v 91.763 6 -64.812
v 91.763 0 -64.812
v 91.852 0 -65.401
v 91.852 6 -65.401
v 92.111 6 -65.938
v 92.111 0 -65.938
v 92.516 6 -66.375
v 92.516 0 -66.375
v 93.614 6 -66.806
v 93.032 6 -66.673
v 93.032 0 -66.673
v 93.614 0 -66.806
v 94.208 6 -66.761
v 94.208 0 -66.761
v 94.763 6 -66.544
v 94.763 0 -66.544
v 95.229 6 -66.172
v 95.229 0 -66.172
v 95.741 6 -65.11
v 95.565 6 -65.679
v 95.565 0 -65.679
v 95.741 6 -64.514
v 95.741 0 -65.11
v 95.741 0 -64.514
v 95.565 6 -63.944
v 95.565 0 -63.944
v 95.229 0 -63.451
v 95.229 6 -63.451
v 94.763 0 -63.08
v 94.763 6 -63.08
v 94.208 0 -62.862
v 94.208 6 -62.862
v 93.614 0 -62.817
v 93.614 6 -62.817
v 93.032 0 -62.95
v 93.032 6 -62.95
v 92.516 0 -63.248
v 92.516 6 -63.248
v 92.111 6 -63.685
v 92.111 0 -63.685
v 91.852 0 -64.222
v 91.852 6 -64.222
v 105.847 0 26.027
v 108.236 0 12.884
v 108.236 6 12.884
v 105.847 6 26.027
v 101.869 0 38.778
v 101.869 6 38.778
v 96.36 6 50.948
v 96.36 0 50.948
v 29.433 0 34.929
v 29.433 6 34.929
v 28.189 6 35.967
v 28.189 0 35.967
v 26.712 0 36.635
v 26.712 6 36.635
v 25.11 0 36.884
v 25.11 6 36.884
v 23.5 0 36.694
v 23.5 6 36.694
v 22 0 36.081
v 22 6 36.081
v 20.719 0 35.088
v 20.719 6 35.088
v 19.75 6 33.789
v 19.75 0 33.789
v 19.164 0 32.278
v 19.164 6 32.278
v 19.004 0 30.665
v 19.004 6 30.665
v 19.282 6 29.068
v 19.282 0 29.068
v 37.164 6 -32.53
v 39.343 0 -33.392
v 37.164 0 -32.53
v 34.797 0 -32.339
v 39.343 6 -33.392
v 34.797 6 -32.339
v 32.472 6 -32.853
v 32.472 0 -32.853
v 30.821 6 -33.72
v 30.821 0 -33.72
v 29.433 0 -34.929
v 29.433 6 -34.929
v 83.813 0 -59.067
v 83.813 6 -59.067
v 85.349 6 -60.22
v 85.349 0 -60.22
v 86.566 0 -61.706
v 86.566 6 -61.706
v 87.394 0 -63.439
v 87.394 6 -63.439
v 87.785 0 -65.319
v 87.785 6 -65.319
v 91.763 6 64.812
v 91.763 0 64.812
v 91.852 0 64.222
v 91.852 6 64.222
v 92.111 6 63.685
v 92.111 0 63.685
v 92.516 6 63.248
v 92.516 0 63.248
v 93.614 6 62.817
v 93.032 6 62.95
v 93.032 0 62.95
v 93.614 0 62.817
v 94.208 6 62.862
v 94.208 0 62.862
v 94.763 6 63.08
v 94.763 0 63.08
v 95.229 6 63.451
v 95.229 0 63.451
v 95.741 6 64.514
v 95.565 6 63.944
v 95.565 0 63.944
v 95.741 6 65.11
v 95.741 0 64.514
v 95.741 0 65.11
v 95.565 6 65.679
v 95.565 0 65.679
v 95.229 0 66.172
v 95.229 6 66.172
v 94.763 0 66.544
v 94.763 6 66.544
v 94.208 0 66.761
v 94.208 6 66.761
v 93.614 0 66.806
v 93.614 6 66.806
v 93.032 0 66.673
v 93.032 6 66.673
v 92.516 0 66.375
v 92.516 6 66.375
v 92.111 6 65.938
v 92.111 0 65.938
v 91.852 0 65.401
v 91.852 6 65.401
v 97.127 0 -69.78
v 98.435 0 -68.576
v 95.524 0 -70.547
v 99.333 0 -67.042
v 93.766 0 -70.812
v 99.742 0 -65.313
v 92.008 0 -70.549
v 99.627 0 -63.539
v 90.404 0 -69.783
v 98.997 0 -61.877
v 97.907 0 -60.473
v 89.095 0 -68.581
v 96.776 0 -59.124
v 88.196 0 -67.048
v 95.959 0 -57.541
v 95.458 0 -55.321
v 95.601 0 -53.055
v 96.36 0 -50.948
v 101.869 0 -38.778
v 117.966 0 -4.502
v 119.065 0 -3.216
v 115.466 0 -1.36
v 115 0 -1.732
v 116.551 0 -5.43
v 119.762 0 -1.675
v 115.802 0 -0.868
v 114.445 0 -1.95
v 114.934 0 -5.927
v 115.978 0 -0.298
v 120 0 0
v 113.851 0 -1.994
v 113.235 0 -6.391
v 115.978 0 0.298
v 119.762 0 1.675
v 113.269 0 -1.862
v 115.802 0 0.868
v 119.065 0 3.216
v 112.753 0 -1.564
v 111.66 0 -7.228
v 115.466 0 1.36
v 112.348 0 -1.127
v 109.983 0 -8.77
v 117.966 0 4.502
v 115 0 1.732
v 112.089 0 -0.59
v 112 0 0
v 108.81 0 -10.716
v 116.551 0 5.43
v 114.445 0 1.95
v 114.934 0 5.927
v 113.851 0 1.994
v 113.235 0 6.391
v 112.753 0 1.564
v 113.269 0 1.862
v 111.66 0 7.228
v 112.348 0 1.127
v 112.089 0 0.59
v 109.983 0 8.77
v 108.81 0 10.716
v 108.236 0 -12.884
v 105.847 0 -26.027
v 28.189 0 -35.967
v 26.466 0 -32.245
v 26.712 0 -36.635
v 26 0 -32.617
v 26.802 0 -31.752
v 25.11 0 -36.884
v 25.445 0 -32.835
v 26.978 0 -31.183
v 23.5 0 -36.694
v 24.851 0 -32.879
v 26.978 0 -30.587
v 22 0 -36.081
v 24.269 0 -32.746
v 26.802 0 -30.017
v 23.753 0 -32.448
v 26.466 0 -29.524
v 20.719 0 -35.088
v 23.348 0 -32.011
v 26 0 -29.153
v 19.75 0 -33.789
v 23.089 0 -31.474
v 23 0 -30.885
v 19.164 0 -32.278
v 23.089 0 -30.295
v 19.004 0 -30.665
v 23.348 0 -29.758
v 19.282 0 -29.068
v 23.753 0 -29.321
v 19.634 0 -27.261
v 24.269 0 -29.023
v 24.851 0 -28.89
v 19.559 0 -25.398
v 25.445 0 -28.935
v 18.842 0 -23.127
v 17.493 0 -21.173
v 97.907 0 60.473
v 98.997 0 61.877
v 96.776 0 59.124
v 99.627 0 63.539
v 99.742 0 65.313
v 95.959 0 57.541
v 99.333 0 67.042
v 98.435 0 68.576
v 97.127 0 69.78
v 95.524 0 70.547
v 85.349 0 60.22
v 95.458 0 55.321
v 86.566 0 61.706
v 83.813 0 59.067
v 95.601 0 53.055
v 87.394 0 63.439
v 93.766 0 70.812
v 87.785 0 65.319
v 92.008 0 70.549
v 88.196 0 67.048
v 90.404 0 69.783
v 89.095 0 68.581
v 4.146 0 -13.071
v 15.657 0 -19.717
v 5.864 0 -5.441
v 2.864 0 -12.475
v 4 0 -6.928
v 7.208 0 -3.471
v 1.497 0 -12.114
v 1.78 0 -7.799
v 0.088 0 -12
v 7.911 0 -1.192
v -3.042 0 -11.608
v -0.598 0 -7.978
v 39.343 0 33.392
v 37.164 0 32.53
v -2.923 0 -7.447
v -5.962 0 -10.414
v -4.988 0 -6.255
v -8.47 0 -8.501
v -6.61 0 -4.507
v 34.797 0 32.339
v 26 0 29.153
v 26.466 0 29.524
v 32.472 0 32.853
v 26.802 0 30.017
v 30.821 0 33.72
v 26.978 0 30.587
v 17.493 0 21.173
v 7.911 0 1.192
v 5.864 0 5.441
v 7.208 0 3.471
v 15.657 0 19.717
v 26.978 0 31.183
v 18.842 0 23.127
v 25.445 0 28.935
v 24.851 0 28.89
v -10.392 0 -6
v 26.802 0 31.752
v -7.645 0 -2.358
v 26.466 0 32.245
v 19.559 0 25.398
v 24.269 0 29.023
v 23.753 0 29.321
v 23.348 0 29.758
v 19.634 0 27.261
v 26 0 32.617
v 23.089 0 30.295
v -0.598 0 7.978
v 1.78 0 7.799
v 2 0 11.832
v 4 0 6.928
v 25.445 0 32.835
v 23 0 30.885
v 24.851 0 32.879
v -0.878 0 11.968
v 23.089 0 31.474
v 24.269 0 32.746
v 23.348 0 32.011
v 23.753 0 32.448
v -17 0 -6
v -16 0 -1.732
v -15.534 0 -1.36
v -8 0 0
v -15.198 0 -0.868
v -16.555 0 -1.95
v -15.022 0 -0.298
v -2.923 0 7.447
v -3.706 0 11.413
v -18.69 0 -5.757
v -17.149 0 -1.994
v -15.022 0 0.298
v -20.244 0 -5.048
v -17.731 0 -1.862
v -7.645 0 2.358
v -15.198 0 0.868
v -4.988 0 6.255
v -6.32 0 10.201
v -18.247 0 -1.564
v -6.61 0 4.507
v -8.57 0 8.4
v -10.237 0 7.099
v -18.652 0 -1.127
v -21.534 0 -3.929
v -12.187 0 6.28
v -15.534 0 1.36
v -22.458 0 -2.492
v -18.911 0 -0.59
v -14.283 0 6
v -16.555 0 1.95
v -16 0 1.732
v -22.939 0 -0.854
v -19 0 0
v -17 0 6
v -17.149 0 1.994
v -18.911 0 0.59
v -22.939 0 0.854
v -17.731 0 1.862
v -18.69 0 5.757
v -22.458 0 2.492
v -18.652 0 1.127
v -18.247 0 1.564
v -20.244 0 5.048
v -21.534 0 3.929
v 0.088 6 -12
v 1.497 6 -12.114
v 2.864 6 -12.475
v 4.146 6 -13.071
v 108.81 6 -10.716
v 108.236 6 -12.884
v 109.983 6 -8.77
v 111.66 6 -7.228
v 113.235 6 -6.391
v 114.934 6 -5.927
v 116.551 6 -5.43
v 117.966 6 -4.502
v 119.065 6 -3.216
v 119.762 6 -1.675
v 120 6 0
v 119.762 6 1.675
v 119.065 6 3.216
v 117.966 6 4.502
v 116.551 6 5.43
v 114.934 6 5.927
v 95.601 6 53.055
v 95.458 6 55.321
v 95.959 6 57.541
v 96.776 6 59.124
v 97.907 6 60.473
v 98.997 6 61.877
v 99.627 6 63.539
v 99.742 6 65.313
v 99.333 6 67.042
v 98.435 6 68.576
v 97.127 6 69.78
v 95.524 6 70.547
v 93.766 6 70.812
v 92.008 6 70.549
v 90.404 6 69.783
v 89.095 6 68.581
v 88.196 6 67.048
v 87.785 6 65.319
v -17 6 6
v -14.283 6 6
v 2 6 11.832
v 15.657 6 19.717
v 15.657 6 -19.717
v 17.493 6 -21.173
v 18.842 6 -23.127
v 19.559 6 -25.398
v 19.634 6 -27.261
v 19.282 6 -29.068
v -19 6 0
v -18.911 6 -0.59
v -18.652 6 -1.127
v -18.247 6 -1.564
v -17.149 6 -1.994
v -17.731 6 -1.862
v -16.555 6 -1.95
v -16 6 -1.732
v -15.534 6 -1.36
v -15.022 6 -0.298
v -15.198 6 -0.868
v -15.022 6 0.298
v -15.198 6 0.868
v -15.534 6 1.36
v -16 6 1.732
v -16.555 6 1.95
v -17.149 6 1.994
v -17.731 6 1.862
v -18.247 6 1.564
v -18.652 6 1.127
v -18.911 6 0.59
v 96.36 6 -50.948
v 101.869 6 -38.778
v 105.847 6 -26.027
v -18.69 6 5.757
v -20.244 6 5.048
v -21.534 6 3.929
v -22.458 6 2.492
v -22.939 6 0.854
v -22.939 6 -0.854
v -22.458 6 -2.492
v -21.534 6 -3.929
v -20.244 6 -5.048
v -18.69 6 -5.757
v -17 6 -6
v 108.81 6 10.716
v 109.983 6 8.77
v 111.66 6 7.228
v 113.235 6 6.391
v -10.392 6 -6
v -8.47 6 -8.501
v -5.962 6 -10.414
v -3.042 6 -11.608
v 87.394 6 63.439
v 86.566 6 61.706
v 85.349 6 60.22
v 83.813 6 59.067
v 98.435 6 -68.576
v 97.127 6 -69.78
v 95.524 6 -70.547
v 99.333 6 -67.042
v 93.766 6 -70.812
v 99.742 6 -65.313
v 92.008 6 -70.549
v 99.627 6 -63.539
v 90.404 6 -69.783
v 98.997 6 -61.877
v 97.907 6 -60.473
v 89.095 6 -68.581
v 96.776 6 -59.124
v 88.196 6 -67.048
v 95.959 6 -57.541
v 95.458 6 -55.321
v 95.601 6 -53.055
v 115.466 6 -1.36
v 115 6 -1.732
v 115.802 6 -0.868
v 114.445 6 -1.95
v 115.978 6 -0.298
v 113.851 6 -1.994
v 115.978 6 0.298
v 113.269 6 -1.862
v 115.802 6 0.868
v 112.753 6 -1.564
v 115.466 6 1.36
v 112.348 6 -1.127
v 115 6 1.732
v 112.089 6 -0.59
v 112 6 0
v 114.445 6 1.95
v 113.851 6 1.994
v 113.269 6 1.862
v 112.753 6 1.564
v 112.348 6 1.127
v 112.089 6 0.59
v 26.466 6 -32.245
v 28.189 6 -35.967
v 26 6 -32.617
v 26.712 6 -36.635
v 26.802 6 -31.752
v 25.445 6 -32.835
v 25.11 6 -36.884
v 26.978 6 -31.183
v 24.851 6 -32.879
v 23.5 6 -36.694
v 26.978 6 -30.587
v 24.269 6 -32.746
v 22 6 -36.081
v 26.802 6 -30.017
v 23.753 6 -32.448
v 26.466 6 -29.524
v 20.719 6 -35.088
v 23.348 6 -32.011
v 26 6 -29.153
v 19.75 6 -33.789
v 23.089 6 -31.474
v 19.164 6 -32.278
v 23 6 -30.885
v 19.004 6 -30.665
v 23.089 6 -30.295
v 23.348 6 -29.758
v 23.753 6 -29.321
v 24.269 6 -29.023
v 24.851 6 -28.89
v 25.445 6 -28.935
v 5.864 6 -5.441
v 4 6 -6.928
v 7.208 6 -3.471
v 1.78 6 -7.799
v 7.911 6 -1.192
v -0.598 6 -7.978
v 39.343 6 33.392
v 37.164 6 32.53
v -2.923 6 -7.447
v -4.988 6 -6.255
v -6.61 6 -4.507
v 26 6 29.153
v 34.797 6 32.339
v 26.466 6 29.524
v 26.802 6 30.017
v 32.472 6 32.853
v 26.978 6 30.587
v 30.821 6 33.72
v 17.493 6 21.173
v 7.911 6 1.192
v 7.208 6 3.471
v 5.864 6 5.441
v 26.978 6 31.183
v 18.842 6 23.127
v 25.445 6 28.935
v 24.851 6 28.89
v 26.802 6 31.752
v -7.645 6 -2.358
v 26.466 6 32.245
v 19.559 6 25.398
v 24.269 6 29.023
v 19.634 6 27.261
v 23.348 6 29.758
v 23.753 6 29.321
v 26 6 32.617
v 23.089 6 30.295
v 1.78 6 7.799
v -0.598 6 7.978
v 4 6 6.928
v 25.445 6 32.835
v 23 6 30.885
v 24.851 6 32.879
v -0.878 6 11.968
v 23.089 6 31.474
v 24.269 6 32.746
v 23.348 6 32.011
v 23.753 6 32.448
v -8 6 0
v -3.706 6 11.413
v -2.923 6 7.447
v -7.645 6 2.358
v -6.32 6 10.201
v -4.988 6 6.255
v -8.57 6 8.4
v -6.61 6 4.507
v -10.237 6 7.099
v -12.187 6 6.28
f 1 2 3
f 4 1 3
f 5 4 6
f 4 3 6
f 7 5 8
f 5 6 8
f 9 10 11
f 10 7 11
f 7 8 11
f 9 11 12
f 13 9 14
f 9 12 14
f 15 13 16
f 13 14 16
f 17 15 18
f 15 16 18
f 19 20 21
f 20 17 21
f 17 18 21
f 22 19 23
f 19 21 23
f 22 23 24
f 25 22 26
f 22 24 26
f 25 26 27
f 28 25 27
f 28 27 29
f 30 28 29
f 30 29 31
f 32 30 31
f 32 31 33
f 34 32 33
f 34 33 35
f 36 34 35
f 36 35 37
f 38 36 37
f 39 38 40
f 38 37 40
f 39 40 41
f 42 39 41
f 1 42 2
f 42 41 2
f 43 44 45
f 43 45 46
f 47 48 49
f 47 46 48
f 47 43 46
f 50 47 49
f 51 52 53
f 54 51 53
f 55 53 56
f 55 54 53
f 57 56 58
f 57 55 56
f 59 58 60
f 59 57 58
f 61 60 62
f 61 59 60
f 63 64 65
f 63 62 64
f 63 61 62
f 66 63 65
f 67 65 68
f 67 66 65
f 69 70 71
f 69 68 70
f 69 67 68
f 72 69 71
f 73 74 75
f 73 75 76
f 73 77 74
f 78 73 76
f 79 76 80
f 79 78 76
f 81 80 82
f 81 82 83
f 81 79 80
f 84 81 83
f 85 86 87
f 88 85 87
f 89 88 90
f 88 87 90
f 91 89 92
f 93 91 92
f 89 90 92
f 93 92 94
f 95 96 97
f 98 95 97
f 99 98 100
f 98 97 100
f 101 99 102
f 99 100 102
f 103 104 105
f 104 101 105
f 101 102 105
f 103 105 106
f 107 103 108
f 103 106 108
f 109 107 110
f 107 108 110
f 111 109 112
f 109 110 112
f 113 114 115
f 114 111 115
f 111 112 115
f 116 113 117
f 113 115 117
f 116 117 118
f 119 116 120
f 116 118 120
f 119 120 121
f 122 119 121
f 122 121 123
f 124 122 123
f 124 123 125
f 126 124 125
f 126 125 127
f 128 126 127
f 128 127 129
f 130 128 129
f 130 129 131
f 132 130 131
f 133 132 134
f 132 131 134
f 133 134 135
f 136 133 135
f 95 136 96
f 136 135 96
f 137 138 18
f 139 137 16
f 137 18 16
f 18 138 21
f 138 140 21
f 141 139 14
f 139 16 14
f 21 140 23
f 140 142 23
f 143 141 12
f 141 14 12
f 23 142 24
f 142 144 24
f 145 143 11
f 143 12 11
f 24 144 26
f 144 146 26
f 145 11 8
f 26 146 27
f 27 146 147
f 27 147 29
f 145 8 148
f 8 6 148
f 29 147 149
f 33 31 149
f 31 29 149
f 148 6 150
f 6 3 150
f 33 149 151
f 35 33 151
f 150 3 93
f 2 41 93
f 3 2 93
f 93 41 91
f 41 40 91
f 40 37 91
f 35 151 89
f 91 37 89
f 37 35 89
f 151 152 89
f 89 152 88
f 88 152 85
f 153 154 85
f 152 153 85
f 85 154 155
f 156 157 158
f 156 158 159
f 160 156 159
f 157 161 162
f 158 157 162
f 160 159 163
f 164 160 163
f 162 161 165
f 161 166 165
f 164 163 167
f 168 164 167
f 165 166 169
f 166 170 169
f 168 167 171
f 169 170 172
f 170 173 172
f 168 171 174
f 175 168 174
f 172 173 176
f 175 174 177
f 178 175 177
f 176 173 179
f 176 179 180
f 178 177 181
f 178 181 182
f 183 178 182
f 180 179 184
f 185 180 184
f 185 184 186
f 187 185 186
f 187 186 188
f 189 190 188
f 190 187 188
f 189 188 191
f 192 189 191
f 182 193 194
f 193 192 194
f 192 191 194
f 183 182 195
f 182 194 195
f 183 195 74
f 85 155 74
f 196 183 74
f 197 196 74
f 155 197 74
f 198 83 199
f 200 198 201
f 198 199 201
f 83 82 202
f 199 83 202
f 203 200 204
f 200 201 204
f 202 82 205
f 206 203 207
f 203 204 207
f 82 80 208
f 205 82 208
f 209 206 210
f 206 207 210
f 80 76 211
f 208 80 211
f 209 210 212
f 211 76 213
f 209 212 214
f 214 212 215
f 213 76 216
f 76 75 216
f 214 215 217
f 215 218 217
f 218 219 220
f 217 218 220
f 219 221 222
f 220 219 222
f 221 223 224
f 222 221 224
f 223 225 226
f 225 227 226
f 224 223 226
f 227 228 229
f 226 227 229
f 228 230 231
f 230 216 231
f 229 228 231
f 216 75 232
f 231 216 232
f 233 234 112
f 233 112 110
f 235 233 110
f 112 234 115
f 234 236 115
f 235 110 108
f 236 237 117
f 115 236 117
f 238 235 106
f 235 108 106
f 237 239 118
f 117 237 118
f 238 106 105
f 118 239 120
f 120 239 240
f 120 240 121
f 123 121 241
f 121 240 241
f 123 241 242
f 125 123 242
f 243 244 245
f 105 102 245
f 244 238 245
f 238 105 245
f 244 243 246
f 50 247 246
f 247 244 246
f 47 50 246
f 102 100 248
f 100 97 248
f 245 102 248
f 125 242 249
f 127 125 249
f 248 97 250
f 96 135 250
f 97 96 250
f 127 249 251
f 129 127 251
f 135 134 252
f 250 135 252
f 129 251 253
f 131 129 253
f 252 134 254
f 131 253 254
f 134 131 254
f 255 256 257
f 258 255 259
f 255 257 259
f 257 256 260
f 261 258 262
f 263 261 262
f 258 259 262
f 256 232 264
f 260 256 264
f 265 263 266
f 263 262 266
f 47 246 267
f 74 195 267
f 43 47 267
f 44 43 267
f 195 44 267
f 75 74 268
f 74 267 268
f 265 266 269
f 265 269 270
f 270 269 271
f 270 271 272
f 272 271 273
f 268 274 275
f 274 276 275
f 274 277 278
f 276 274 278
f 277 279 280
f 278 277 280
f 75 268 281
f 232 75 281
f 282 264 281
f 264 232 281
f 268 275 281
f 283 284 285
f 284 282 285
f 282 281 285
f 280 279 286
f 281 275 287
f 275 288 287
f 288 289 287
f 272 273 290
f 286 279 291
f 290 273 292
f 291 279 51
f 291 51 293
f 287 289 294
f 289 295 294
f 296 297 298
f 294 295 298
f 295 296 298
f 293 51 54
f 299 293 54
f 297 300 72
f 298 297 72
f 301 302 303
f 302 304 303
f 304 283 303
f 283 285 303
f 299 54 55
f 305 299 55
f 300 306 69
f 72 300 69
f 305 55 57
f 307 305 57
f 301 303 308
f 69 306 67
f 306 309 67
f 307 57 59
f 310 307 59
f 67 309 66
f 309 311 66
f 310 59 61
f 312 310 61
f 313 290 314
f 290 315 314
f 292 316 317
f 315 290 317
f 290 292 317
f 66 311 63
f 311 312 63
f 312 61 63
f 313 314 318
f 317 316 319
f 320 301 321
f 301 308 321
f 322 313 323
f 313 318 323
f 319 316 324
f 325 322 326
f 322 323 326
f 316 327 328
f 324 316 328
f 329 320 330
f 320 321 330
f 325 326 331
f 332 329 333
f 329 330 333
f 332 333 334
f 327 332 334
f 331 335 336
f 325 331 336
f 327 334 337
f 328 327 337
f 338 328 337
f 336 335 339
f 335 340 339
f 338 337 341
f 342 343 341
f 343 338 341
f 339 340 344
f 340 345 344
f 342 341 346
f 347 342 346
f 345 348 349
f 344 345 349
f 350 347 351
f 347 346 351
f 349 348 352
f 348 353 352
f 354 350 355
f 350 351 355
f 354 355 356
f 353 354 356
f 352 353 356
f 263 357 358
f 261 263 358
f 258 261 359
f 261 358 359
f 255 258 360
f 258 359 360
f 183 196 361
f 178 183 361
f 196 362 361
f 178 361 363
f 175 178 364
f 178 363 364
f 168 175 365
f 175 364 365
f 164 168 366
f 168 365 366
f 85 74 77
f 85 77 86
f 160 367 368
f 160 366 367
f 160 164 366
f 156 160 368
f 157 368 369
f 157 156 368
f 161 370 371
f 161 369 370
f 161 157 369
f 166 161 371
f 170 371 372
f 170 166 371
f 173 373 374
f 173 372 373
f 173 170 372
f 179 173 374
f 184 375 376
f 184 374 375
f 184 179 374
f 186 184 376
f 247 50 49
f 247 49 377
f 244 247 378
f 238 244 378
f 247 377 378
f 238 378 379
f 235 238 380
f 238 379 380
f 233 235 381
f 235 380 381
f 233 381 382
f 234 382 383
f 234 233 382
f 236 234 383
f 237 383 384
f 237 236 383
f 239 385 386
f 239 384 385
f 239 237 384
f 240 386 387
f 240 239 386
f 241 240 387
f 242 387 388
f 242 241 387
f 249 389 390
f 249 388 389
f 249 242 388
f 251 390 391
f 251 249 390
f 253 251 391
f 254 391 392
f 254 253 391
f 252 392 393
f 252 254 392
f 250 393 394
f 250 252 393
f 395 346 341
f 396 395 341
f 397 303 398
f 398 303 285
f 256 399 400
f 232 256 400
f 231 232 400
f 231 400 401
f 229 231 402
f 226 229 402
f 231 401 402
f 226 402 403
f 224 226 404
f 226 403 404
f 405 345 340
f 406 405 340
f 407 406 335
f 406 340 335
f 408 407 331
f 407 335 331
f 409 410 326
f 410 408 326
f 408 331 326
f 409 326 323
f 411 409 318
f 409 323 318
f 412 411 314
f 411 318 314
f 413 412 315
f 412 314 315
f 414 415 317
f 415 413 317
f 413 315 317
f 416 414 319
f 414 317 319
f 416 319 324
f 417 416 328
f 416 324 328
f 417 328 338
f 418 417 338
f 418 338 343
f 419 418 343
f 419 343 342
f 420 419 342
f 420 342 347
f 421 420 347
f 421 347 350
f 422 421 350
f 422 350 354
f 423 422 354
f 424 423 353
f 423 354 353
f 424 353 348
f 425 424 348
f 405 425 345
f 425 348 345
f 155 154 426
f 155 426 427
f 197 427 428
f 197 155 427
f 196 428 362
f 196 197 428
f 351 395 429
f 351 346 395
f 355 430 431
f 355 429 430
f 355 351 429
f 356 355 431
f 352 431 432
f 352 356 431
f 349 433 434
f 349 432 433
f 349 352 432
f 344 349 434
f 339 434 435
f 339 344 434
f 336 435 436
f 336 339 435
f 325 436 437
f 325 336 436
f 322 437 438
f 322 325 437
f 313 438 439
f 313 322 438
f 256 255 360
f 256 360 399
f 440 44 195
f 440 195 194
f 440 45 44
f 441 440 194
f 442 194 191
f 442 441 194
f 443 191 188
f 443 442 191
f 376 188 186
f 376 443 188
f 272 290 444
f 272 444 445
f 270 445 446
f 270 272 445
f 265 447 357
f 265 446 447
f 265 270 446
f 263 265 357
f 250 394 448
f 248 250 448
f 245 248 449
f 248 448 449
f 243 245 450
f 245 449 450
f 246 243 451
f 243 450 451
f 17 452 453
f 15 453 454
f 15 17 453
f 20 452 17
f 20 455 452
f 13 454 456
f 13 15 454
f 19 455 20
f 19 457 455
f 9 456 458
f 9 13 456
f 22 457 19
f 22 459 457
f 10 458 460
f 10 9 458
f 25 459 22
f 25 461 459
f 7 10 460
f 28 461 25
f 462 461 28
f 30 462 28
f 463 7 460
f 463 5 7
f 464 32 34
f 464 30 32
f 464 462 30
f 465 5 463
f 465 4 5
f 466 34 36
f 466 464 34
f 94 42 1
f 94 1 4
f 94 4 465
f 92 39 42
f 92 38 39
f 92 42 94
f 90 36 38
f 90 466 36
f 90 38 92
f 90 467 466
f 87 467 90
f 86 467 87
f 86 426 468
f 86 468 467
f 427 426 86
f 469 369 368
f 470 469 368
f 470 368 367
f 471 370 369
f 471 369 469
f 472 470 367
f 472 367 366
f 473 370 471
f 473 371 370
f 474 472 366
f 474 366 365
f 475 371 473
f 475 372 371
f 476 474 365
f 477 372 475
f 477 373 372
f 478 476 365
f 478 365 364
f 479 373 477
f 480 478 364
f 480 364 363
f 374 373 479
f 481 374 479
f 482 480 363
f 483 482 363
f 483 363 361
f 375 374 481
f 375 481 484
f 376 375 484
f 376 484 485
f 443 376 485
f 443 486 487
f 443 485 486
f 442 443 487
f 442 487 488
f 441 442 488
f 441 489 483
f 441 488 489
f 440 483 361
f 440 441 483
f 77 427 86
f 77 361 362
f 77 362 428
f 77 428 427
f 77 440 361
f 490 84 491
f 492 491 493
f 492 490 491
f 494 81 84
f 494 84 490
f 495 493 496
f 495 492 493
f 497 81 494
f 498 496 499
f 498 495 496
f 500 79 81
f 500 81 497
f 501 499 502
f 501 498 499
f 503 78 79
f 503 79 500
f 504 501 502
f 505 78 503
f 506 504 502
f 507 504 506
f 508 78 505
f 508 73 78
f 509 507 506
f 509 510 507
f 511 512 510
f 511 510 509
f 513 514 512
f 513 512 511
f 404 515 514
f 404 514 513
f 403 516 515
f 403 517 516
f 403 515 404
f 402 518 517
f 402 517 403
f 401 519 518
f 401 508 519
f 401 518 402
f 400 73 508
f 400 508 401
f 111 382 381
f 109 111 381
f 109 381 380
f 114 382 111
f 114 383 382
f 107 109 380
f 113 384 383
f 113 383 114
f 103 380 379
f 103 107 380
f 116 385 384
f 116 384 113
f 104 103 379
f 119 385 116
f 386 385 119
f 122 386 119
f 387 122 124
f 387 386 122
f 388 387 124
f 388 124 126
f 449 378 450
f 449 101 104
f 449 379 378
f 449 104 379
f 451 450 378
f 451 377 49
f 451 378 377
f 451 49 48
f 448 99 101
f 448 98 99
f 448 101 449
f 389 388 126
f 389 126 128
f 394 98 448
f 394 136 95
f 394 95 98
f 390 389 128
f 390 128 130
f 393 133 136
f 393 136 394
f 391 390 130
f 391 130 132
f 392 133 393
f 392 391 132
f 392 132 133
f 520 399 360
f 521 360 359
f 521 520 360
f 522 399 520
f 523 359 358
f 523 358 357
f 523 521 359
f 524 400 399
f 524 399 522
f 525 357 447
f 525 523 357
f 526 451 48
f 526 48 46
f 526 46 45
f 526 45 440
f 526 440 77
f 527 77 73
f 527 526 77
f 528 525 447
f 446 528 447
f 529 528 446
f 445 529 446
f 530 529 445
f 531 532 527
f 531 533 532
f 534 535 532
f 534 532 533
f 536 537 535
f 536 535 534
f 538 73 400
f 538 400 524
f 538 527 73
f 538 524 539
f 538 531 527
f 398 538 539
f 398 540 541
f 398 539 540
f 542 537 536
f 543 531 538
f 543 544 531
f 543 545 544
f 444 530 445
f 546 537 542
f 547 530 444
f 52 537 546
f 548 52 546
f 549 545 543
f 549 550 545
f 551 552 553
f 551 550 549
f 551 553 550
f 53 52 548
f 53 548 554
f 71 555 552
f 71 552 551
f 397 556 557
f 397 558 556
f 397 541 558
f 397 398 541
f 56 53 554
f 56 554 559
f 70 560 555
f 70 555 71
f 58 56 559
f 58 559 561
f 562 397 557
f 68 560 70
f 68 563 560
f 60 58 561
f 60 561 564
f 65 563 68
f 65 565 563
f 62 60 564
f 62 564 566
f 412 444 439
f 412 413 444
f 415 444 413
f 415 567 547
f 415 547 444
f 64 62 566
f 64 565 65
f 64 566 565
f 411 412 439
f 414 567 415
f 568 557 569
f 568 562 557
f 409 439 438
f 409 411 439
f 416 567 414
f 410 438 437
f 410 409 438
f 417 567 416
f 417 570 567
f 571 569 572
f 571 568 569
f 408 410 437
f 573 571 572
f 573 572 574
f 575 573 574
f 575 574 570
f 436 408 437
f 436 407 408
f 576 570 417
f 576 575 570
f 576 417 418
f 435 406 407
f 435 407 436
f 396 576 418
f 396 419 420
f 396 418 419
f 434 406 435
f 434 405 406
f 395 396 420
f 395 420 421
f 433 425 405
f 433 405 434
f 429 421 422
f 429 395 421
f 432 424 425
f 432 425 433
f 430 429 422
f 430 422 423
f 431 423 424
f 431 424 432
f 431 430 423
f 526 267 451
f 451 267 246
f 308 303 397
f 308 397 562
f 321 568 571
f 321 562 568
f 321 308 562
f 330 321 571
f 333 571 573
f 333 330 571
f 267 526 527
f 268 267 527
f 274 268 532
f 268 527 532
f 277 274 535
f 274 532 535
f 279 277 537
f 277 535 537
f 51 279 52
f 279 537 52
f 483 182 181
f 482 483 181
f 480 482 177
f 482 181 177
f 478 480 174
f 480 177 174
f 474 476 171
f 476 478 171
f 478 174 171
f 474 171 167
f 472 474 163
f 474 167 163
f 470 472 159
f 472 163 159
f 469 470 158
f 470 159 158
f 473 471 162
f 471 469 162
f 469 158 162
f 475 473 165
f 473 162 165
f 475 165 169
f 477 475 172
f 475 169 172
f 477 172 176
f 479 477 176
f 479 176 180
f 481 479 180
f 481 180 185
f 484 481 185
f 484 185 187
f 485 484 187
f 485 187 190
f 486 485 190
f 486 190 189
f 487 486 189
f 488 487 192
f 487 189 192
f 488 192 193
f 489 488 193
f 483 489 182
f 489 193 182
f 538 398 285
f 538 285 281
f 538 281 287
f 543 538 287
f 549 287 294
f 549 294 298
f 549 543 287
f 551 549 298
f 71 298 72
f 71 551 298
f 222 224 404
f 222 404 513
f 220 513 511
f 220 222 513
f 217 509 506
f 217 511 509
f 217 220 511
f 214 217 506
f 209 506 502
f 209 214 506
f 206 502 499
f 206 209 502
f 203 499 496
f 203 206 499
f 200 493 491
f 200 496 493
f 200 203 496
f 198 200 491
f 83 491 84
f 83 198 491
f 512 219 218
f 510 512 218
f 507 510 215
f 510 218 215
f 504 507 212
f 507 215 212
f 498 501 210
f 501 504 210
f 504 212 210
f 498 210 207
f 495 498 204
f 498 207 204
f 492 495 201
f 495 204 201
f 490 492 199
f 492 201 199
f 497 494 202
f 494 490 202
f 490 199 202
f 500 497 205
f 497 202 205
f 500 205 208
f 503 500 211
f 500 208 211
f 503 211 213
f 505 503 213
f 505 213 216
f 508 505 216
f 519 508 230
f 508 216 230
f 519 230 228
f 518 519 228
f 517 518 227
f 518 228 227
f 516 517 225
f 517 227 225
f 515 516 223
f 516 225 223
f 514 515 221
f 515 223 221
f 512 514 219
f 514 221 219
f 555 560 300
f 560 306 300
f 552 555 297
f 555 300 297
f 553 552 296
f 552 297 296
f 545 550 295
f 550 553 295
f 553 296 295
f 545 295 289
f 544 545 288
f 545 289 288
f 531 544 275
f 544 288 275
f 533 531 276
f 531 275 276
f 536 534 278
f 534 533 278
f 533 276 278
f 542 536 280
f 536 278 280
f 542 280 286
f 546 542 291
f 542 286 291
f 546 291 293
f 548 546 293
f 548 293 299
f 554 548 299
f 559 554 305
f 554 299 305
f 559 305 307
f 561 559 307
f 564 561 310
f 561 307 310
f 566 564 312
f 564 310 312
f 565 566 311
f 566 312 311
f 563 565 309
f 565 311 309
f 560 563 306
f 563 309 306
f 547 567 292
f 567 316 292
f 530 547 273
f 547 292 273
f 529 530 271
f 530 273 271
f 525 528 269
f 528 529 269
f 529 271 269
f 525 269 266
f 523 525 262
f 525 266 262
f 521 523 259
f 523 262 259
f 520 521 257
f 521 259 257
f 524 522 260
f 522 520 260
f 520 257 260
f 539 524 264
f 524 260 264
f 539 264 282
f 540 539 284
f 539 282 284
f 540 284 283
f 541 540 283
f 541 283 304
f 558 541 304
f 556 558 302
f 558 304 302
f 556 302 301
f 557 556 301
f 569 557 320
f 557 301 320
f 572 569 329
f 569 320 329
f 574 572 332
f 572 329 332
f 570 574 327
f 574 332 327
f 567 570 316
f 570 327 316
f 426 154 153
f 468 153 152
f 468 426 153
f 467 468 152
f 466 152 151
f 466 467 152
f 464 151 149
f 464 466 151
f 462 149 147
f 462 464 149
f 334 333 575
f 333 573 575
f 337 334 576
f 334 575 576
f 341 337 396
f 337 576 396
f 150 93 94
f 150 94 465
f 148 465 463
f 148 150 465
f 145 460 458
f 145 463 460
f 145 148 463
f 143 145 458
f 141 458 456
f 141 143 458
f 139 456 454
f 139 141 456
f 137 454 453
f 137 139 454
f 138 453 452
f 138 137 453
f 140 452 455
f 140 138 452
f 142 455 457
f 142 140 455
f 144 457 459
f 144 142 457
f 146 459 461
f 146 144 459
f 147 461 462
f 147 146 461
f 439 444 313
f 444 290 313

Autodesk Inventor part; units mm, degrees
ref_plane "YZ Plane" through (0, 0, 0) normal (1, 0, 0) x (0, 1, 0)
ref_plane "XZ Plane" through (0, 0, 0) normal (0, 1, 0) x (-1, 0, 0)
ref_plane "XY Plane" through (0, 0, 0) normal (0, 0, 1) x (1, 0, 0)
sketch "Sketch1" plane through (0, 0, 0) normal (0, 1, 0) x (-1, 0, 0)
  circle A0 centre (0, 0) radius 8
  arc A1 (-82.4777, 58.296) -> (-82.4777, -58.296) centre (0, 0) ccw construction
  arc A2 (-86.8253, 60.806) -> (-86.8253, -60.806) centre (0, 0) ccw construction
  arc A3 (-2, -11.8322) -> (-2, 11.8322) centre (0, 0) ccw
  line L0 (-2, -11.8322) -> (-89.433, -62.3116)
  arc A4 (-89.433, 62.3116) -> (-89.433, -62.3116) centre (0, 0) ccw
  line L1 (-2, 11.8322) -> (-89.433, 62.3116)
  circle A5 centre (-93.7631, -64.8116) radius 2
  circle A6 centre (-93.7631, 64.8116) radius 2
  circle A7 centre (-114, 0) radius 2
  circle A8 centre (-25, -30.8847) radius 2
  circle A9 centre (-25, 30.8847) radius 2
  circle A10 centre (17, 0) radius 2
  line L2 (10.3923, -6) -> (17, -6)
  arc A11 (17, -6) -> (17, 6) centre (17, 0) ccw
  line L3 (17, 6) -> (10.3923, 6)
  line L4 (-22.3038, -23.5546) -> (-19.8038, -27.8847)
  arc A12 (-30.1962, -33.8847) -> (-19.8038, -27.8847) centre (-25, -30.8847) ccw
  line L5 (-30.1962, -33.8847) -> (-32.6962, -29.5546)
  line L6 (-22.3038, 23.5546) -> (-19.8038, 27.8847)
  arc A13 (-19.8038, 27.8847) -> (-30.1962, 33.8847) centre (-25, 30.8847) ccw
  line L7 (-30.1962, 33.8847) -> (-32.6962, 29.5546)
  line L8 (-92.8025, 57.1726) -> (-96.9102, 59.7032)
  arc A14 (-88.567, 61.8116) -> (-96.9102, 59.7032) centre (-93.7631, 64.8116) ccw
  line L9 (-108.8347, -6) -> (-114, -6)
  arc A15 (-114, 6) -> (-114, -6) centre (-114, 0) ccw
  line L10 (-114, 6) -> (-108.8347, 6)
  line L11 (-92.8025, -57.1726) -> (-96.9102, -59.7032)
  arc A16 (-96.9102, -59.7032) -> (-88.567, -61.8116) centre (-93.7631, -64.8116) ccw
  point P0 (-109, 0)
  point P1 (12, 0)
  dimension "d0" = 16
  dimension "d1" = 101
  dimension "d3" = 12
  dimension "d6" = 60
  dimension "d7" = 2
  dimension "d8" = 5
  dimension "d9" = 3
  dimension "d10" = 4
  dimension "d12" = 5
  dimension "d13" = 5
  dimension "d14" = 5
  dimension "d15" = 5
  dimension "d16" = 5
  dimension "d17" = 5
  dimension "d18" = 25
  dimension "d19" = 6
  dimension "d20" = 6
extrude "Extrusion1" add sketch "Sketch1" along normal blind 6 contours L0 A4 L1 A3
extrude "Extrusion2" add sketch "Sketch1" along normal blind 6 contours A3 L3 A11 L2 | L4 A12 L5 L0 | A16 L11 A4 L0 | L1 L7 A13 L6 | L1 A4 L8 A14 | L9 A15 L10 A4
fillet "Fillet1" radius 8 12 edges at (32.6962, 3, 29.5546) (22.3038, 3, 23.5546) (88.567, 3, 61.8116) (92.8025, 3, 57.1726) (108.8347, 3, -6) (108.8347, 3, 6) (92.8025, 3, -57.1726) (88.567, 3, -61.8116) (32.6962, 3, -29.5546) (22.3038, 3, -23.5546) (2, 3, -11.8322) (-10.3923, 3, 6)
properties part number "RailBaseBottom" material "Polycarbonate, Clear"
